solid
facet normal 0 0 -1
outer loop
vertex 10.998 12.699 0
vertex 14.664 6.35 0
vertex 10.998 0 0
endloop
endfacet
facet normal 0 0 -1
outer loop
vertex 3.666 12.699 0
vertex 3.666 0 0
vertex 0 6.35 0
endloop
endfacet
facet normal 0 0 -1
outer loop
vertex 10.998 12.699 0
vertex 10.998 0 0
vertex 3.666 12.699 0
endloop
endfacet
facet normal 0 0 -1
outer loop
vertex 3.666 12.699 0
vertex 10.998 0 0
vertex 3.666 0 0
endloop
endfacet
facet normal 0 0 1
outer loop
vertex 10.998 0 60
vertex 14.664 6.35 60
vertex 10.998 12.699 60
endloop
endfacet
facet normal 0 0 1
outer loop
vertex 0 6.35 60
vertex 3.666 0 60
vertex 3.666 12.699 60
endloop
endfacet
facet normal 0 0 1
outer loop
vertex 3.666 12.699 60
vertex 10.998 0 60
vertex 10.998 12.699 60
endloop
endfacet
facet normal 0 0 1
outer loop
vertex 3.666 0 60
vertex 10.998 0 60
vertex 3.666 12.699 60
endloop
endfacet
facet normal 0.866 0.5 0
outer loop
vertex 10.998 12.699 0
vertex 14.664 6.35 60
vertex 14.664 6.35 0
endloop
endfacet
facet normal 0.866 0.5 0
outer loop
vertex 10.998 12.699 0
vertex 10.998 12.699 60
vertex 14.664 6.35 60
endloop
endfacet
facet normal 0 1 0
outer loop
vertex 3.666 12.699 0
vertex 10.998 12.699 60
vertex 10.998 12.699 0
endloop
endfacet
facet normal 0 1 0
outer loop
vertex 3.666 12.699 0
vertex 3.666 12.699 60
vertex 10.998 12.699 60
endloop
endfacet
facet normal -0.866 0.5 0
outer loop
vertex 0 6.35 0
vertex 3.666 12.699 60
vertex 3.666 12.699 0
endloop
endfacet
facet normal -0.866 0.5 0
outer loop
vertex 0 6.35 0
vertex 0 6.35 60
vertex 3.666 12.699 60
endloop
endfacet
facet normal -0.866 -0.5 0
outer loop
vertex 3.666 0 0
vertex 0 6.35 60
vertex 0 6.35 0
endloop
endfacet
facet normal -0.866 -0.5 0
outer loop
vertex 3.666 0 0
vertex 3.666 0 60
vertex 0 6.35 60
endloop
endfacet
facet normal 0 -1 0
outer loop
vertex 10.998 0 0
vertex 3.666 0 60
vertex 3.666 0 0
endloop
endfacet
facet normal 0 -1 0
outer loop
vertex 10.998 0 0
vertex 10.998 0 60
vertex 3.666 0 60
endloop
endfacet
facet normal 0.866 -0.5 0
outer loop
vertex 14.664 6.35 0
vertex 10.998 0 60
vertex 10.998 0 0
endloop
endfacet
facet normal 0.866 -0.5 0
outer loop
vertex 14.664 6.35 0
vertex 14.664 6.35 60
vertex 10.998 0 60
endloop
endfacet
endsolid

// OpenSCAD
$fn = 32;

// ----------------------------------------------------------------------
// Key bar: hex key, 60 mm thick
// ----------------------------------------------------------------------

// --- parameters (mm) ---
profile_height = 60;      // extrusion height
profile_points = 6;       // points of the closed outline

profile = [[14.664, 6.35], [10.998, 12.699], [3.666, 12.699], [0, 6.35], [3.666, 0], [10.998, 0]];  // single closed polygon, 6 points, counter clockwise

// --- the one profile operation ---
linear_extrude(height = profile_height) polygon(points = profile);
